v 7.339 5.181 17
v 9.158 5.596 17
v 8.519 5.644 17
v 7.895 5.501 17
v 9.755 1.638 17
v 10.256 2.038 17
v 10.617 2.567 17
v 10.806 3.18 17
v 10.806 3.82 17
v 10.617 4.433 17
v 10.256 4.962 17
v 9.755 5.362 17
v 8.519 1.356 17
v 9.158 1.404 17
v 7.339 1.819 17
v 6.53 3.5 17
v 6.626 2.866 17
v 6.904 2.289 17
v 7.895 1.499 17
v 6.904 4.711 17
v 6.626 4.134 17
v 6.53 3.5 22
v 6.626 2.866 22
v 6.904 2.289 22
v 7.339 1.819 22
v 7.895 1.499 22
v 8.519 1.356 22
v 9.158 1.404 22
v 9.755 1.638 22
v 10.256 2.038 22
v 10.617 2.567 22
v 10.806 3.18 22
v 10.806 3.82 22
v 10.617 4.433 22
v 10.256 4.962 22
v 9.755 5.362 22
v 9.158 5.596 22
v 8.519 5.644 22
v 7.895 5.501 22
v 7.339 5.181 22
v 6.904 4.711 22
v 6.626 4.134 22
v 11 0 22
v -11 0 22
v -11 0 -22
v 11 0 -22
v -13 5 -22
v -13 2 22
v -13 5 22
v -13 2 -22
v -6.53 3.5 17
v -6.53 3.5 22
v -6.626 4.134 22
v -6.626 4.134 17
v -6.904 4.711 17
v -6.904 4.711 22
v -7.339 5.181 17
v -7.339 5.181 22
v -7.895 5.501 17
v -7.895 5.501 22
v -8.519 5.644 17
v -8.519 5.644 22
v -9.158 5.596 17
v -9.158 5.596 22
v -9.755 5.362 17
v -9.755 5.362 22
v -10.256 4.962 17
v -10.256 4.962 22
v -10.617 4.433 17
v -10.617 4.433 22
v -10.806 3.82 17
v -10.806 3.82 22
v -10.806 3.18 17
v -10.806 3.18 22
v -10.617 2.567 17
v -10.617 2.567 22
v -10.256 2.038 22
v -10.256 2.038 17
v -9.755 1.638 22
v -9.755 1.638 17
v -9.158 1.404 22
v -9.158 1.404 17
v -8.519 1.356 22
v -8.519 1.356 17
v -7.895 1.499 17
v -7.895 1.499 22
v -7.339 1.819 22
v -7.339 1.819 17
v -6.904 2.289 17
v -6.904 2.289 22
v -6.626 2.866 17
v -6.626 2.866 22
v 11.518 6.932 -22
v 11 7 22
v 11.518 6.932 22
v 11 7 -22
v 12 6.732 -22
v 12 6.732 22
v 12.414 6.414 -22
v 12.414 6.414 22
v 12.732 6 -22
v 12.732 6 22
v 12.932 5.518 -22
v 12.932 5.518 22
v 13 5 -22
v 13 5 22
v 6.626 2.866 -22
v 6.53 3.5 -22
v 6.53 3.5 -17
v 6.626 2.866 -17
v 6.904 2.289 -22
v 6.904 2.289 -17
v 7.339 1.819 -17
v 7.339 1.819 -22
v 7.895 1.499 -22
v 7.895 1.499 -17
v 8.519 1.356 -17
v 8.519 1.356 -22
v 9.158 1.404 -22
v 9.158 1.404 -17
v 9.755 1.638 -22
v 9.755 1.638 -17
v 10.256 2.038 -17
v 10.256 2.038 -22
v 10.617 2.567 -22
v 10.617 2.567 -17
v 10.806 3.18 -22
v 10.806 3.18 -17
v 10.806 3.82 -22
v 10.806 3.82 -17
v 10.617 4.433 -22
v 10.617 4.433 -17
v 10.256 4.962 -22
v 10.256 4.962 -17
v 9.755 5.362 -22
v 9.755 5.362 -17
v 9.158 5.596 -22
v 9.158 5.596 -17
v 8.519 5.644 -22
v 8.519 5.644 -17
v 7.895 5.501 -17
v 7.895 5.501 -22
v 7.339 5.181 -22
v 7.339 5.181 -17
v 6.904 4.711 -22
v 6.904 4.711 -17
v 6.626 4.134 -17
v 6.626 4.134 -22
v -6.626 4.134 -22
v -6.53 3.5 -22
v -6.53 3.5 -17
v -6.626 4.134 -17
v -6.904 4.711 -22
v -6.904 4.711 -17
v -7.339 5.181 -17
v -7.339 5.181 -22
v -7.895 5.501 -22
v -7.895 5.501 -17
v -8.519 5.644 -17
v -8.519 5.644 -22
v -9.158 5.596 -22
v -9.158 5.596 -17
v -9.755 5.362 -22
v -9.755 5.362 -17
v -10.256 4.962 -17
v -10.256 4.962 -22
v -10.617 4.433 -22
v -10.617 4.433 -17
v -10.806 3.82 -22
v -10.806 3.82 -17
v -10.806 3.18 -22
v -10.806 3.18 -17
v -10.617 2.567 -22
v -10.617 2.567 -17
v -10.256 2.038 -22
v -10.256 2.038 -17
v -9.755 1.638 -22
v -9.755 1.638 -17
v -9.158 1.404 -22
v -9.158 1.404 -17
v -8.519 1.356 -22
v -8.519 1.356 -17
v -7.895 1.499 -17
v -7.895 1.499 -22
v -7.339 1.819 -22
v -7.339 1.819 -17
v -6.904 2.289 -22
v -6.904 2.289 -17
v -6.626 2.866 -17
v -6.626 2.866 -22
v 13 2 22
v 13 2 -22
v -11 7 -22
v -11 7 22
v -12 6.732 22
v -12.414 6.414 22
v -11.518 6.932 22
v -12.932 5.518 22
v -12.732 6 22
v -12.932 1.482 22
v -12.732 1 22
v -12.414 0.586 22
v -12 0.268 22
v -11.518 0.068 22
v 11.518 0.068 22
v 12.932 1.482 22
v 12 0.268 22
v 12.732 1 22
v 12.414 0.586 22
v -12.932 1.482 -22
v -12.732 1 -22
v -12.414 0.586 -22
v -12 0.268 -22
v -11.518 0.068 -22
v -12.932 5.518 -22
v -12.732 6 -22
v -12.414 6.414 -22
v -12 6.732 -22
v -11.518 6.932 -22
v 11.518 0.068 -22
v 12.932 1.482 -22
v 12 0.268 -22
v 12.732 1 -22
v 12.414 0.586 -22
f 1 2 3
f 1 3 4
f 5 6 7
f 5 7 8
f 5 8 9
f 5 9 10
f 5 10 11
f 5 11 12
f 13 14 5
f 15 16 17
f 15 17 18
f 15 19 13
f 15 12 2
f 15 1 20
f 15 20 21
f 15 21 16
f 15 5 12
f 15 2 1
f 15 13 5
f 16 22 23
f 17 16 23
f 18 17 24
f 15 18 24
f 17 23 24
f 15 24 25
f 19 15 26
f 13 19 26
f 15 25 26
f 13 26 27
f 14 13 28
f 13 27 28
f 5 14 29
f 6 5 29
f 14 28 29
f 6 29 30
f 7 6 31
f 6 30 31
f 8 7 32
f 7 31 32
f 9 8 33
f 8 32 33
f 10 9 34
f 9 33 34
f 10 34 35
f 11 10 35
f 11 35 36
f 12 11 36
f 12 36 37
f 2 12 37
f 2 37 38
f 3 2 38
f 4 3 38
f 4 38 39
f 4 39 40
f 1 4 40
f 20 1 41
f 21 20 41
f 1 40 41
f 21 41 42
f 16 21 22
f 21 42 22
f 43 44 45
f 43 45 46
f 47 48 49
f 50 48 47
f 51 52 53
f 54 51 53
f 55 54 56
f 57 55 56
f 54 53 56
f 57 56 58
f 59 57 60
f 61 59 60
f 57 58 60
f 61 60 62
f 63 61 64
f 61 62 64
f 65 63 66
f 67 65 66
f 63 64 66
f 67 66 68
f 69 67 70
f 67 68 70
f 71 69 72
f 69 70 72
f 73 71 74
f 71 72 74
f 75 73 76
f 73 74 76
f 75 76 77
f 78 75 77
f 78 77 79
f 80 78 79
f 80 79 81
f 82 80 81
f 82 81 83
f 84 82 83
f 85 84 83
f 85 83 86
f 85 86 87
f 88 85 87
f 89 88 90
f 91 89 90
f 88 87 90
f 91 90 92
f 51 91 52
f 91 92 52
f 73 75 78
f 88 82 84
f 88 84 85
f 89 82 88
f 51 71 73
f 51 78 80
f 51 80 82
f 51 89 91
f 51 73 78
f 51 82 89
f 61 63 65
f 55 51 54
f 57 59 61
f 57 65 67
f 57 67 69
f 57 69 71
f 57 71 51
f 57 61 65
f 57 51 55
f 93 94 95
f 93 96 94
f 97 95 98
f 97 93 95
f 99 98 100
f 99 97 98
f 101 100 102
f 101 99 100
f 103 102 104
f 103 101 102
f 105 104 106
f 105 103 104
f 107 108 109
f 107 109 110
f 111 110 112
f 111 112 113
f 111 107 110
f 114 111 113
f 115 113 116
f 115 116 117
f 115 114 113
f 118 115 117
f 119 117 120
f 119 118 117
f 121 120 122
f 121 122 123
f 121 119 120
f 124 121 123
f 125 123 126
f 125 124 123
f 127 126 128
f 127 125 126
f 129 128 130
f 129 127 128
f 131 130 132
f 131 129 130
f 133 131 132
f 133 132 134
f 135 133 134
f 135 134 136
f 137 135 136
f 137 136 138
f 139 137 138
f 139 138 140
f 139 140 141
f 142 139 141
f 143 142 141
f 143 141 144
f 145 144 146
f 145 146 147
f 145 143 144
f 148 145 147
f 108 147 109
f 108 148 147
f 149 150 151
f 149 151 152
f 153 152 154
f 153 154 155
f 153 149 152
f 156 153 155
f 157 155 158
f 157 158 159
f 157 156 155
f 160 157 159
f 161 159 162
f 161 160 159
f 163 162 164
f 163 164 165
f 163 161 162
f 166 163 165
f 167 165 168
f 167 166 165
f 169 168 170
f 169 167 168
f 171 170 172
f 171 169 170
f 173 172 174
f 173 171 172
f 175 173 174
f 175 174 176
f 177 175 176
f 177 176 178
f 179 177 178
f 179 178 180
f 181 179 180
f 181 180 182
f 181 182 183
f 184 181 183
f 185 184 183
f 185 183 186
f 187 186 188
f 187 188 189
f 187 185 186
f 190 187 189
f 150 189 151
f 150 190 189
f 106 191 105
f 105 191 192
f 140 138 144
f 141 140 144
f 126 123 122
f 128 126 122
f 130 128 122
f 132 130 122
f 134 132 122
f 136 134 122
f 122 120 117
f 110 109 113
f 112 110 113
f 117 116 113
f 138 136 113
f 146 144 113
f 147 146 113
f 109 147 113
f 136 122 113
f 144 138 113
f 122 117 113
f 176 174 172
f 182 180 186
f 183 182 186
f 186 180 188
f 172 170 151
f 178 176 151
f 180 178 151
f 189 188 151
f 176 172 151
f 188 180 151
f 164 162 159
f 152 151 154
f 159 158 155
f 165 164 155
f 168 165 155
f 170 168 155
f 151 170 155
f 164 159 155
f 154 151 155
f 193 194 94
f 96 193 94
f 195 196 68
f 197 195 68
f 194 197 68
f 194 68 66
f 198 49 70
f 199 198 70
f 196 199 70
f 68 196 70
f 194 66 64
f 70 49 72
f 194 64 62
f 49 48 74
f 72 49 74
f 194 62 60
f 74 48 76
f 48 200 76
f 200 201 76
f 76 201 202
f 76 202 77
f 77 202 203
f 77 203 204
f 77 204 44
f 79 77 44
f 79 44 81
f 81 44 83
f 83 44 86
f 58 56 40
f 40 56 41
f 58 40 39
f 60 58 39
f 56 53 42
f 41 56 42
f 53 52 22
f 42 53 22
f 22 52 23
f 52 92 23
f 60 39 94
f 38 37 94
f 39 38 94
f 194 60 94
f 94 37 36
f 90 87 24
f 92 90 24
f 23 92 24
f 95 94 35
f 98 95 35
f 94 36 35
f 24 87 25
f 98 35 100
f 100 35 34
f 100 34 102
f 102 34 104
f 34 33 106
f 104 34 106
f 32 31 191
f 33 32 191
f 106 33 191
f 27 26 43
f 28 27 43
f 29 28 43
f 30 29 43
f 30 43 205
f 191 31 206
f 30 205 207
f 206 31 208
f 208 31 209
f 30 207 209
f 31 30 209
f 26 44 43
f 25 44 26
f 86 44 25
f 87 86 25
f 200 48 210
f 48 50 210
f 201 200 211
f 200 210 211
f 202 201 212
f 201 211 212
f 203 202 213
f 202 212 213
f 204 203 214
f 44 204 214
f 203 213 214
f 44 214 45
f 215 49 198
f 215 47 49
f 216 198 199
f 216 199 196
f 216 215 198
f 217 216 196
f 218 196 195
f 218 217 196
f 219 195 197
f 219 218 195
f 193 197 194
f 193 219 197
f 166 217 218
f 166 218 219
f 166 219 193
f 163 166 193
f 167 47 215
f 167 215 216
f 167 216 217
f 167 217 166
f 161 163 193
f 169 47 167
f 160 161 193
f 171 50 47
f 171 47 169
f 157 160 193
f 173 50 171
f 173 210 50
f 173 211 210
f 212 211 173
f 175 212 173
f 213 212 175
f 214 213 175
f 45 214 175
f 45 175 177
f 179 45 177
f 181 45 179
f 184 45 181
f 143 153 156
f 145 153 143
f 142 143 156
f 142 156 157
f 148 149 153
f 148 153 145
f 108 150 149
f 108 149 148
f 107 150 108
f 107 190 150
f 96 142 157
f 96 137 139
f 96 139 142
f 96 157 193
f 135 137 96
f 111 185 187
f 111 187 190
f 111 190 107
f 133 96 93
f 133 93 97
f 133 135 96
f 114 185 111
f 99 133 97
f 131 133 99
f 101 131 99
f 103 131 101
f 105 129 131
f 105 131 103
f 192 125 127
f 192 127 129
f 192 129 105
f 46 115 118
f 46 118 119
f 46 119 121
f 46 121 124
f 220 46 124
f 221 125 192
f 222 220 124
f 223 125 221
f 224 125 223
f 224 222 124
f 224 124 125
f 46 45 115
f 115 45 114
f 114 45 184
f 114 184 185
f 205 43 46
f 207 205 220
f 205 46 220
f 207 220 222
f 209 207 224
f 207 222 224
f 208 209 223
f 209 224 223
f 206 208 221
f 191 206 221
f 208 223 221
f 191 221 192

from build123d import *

# Parameters (mm, degrees)
SZKIC1_W                    = 26
SZKIC1_H                    = 44
DODANIE_WYCI_GNI_CIE1_DEPTH = 7
SZKIC2_R                    = 2.15
WYTNIJ_WYCI_GNI_CIE1_DEPTH  = 5
ZAOKR_GLENIE1_R             = 2


with BuildPart() as part:
    # Szkic1 → Dodanie-wyciągnięcie1 (new body)
    with BuildSketch(Plane(origin=(0, 0, 0), x_dir=(1, 0, 0), z_dir=(0, 1, 0))):
        Rectangle(SZKIC1_W, SZKIC1_H)
    extrude(amount=DODANIE_WYCI_GNI_CIE1_DEPTH)

    # Szkic2 → Wytnij-wyciągnięcie1 (cut)
    with BuildSketch(Plane.XY.offset(22)):
        with Locations((-8.68, 3.5)):
            Circle(SZKIC2_R)
        with Locations(Location((8.68, 3.5, 0), (0, 0, 180))):
            Circle(SZKIC2_R)
    wytnij_wyci_gni_cie1 = extrude(amount=-WYTNIJ_WYCI_GNI_CIE1_DEPTH, mode=Mode.SUBTRACT)

    # Lustro1: Wytnij-wyciągnięcie1 across plane
    add(wytnij_wyci_gni_cie1.mirror(Plane.XY), mode=Mode.SUBTRACT)

    # Zaokrąglenie1
    zaokr_glenie1_edges = [part.edges().sort_by_distance(p)[0] for p in [
        (-13, 7, 0),
        (13, 7, 0),
        (-13, 0, 0),
        (13, 0, 0),
    ]]
    fillet(zaokr_glenie1_edges, radius=ZAOKR_GLENIE1_R)


solid = part.part
